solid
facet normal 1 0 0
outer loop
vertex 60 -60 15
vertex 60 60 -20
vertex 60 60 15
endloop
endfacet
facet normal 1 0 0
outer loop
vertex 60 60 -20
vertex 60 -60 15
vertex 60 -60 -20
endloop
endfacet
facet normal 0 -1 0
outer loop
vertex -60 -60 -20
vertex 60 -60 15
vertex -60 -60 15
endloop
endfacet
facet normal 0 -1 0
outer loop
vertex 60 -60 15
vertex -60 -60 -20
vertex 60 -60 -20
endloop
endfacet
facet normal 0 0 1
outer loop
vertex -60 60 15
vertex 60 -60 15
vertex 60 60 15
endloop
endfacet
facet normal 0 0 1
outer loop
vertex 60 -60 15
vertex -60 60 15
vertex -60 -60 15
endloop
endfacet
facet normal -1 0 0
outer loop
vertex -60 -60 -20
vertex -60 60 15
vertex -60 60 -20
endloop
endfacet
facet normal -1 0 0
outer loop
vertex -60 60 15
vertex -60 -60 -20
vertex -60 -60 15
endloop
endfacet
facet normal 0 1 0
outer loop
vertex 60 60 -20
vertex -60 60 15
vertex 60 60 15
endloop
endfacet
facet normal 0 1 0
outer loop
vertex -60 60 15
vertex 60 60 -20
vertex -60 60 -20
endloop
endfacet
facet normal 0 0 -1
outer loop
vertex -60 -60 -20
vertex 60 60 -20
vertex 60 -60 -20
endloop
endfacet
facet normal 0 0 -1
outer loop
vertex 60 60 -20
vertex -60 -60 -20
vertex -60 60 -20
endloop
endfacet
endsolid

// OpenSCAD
//
// ============================================================================
// SteamMachine UM790
// Project Phoenix
//
// Archivo  : noctua.scad
// Versión  : 1.0
// Fecha    : 2026-08-03
//
// Volumen mecánico de referencia del ventilador Noctua NF-A12x15 PWM
// (120 x 120 x 15 mm) para el ensamblaje virtual v1.
//
// NO ES UNA PIEZA IMPRIMIBLE.
//
// Sistema de coordenadas LOCAL de este módulo:
//   Origen (0,0,0) = centro del ventilador en X/Y, cara inferior
//                     (cara de aspiración, hacia el disipador).
//   +Z = hacia la cara superior (cara de expulsión, hacia la rejilla
//        de la tapa).
//
// Refrigeración vertical del proyecto: entrada inferior, salida
// superior (ver docs/DESIGN_RULES.md). Este ventilador se monta
// pegado a la tapa, expulsando el aire hacia arriba.
//
// ============================================================================

include <../../../00_parametros.scad>;

$fn = 48;

part_version = "1.0";


//=============================================================================
// COLORES
//=============================================================================

noctuaFrameColor = [0.10,0.10,0.10,1.0];
noctuaHubColor   = [0.65,0.55,0.20,1.0];
noctuaFlowColor  = [0.30,0.70,1.00,0.12];


//=============================================================================
// MARCO DEL VENTILADOR
//=============================================================================

module noctuaFrame()
{

    color(noctuaFrameColor)

    translate([-fan_size/2,-fan_size/2,0])

    linear_extrude(height = fan_thickness)

        offset(r = -fan_frame_corner_r)
        offset(delta = fan_frame_corner_r)

            square([fan_size,fan_size]);

}


//=============================================================================
// BUJE / MOTOR CENTRAL (referencia visual)
//=============================================================================

module noctuaHub()
{

    color(noctuaHubColor)

    translate([0,0,fan_thickness*0.15])

        cylinder(
            d = fan_hub_diameter,
            h = fan_thickness*0.7
        );

}


//=============================================================================
// CUERPO MECÁNICO (para comprobación de colisiones "duras")
//=============================================================================

module noctuaBody()
{

    union()
    {
        noctuaFrame();
        noctuaHub();
    }

}


//=============================================================================
// VOLUMEN DE SEGURIDAD DEL FLUJO DE AIRE
//
// Columna de aire bajo el ventilador (hacia el disipador) que debe
// permanecer libre de cualquier otro componente u obstáculo impreso.
//=============================================================================

module noctuaAirflowKeepout(depth = 20)
{

    color(noctuaFlowColor)

    translate([-fan_size/2,-fan_size/2,-depth])

        cube([
            fan_size,
            fan_size,
            depth
        ]);

}


//=============================================================================
// CONJUNTO COMPLETO (visualización)
//=============================================================================

module noctua()
{

    noctuaBody();

    noctuaAirflowKeepout();

}


//=============================================================================
// PREVIEW
//=============================================================================

noctua();
